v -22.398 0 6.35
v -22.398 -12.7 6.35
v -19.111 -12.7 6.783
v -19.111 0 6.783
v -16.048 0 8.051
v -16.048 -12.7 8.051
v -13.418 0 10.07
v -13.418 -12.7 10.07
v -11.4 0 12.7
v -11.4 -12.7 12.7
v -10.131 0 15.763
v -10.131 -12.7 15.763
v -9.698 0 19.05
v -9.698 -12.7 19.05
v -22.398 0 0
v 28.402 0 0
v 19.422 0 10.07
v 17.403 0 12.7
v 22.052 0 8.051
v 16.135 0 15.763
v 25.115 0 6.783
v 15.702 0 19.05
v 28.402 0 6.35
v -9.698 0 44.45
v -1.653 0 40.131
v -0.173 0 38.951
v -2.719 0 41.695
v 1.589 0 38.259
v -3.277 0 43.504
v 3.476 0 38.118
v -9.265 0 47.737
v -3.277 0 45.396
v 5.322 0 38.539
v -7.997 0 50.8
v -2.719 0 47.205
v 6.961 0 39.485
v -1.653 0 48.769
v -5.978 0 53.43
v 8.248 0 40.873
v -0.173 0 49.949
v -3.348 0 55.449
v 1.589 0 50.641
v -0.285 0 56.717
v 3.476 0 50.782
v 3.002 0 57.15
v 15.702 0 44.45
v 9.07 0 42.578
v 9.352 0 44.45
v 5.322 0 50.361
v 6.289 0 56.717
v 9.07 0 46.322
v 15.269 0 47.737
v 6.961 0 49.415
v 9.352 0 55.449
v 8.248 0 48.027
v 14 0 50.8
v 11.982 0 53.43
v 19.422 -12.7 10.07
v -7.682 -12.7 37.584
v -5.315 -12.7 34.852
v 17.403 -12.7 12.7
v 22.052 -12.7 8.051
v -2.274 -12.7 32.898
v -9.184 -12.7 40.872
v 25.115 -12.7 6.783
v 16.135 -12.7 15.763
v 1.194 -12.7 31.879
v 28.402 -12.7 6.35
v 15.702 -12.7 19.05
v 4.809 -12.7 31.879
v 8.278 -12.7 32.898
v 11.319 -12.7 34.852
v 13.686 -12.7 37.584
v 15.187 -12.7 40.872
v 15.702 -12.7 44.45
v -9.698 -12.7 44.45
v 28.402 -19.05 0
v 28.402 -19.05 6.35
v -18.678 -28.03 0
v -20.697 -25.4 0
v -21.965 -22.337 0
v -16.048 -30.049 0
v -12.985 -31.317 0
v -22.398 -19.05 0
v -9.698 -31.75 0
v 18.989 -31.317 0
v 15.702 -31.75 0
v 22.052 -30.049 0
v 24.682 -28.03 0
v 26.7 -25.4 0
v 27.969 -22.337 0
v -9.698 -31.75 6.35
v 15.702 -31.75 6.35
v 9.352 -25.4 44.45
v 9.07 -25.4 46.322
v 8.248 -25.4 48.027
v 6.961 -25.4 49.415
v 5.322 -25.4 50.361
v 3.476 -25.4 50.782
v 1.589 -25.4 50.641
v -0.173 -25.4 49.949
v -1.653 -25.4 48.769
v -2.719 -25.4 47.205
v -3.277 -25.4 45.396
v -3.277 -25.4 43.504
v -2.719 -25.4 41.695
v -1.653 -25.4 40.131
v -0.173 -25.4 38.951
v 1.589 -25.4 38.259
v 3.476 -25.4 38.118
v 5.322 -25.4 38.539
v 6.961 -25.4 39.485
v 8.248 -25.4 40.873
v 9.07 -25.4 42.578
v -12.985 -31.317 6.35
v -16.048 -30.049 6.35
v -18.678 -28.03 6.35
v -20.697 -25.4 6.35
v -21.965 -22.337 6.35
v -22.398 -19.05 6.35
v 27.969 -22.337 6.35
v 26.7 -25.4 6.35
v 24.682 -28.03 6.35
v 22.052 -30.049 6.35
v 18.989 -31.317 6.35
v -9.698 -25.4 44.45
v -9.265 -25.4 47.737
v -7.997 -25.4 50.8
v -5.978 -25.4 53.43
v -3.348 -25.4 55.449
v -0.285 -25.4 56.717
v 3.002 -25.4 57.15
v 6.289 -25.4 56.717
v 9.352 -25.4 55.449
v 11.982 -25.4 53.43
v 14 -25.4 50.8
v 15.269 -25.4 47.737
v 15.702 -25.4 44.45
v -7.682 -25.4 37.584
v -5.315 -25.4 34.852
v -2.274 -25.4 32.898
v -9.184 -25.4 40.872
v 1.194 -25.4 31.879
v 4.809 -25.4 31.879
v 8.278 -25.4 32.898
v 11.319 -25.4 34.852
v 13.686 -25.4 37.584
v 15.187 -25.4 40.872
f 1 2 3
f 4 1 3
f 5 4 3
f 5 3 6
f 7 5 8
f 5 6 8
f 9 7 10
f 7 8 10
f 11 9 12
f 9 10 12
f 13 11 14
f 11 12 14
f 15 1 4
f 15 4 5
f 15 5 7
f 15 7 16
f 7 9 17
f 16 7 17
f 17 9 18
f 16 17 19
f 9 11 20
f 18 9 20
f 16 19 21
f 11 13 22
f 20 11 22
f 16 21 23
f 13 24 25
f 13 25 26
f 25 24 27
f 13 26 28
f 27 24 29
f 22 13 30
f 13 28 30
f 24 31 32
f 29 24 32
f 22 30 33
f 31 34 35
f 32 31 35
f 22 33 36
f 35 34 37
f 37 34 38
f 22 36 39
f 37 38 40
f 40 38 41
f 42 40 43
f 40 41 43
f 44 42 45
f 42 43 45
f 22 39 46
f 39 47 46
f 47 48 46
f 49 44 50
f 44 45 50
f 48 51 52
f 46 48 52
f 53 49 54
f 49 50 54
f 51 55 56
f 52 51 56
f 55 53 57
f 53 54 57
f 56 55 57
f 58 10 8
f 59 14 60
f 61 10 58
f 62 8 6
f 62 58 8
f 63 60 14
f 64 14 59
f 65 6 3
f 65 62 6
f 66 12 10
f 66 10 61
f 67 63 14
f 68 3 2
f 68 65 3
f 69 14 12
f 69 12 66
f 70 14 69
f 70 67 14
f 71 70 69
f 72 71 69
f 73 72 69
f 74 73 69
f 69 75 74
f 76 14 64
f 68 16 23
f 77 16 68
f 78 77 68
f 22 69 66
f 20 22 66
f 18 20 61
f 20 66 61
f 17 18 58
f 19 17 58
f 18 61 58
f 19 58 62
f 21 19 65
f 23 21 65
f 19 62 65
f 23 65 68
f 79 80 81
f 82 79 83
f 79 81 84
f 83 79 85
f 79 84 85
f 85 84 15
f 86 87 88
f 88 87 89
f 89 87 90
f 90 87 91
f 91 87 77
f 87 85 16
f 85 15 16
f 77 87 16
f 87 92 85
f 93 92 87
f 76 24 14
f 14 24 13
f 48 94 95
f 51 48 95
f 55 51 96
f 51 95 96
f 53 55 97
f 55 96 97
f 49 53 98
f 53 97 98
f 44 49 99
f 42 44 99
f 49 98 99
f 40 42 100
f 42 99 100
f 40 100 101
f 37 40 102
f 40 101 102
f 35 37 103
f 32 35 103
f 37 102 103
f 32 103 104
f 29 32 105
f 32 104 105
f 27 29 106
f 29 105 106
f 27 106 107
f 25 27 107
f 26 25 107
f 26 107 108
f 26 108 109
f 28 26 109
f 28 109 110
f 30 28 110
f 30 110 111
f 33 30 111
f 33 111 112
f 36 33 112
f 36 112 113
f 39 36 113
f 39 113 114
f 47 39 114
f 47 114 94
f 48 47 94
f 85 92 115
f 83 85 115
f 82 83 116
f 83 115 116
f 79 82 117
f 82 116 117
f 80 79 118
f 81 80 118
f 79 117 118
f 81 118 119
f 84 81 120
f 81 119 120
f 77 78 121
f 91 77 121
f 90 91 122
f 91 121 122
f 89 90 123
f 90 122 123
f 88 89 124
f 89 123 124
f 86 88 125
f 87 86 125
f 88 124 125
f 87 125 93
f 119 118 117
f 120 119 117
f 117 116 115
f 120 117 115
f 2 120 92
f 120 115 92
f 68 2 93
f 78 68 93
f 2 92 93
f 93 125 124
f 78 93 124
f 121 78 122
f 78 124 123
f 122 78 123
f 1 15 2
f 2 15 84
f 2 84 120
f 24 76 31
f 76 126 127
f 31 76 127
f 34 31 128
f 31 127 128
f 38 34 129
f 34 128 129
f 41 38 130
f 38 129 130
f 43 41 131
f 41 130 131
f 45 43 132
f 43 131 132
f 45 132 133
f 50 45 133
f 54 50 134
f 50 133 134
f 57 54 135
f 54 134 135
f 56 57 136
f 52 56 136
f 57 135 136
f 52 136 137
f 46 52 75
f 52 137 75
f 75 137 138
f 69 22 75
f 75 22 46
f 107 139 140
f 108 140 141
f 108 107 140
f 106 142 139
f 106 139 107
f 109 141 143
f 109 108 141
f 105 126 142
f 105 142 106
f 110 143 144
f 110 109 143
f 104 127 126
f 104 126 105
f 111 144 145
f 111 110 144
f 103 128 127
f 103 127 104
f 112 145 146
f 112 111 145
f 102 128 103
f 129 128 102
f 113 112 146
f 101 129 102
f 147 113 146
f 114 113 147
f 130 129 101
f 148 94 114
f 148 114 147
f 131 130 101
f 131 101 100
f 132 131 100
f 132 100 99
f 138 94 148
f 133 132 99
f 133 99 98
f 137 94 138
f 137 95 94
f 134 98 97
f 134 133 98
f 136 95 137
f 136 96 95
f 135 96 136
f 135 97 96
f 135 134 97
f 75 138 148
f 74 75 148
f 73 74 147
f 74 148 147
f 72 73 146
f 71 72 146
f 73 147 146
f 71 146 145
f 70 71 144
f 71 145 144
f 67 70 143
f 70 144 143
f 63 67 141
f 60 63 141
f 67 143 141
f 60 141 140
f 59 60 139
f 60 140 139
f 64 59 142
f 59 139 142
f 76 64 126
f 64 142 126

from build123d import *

# Parameters (mm, degrees)
F1_DEPTH  = 31.75
F2_R      = 6.35
F3_DEPTH  = 31.75
F5_DEPTH  = 31.75
F7_DEPTH  = 19.05
F8_DEPTH  = 6.35
F9_W      = 12.7
F9_H      = 12.7
F10_DEPTH = 31.75
F11_W     = 12.7
F11_H     = 12.7
F12_DEPTH = 19.05
F14_DEPTH = 12.7
F15_W     = 12.7
F15_H     = 12.7
F16_DEPTH = 12.7
F18_DEPTH = 12.7
F19_R     = 1.5875
F20_DEPTH = 12.7
F22_DEPTH = 6.35


# Not quite as in the source:
# - a feature names something its author has since deleted; it is built from what else it names


with BuildPart() as f1:
    # F0 (on Front) → F1 (new body)
    with BuildSketch(Plane.XZ):
        Polygon((-9.6981803781, 6.35), (-22.3981803781, 6.35), (-22.3981803781, 0), (28.4018196219, 0), (28.4018196219, 6.35), (15.7018196219, 6.35), (15.7018196219, 57.15), (-9.6981803781, 57.15), align=None)
    extrude(amount=F1_DEPTH)

    # F2 (on face) → F3 (cut)
    with BuildSketch(Plane.XZ.offset(31.75)):
        with Locations((3.0018196219, 44.45)):
            Circle(F2_R)
    extrude(amount=-F3_DEPTH, mode=Mode.SUBTRACT)

    # F4 (on face) → F5 (cut)
    with BuildSketch(Plane.XZ.offset(31.75)):
        with BuildLine():
            ThreePointArc((-9.6981803781, 44.45), (-5.9784365163, 53.4302561039), (3.0018195733, 57.15))
            Line((3.0018195733, 57.15), (-9.6981803781, 57.15))
            Line((-9.6981803781, 57.15), (-9.6981803781, 44.45))
        make_face()
        with BuildLine():
            ThreePointArc((3.0018195733, 57.15), (11.9820757258, 53.4302561383), (15.7018196219, 44.45))
            Line((15.7018196219, 44.45), (15.7018196219, 57.15))
            Line((15.7018196219, 57.15), (3.0018195733, 57.15))
        make_face()
    extrude(amount=-F5_DEPTH, mode=Mode.SUBTRACT)

    # F6 (on face) → F7 (cut)
    with BuildSketch(Plane.XZ.offset(31.75)):
        with BuildLine():
            Line((15.7018196219, 6.35), (15.7018196219, 44.45))
            ThreePointArc((15.7018196219, 44.45), (3.0018196219, 31.75), (-9.6981803781, 44.45))
            Line((-9.6981803781, 44.45), (-9.6981803781, 6.35))
            Line((-9.6981803781, 6.35), (15.7018196219, 6.35))
        make_face()
    extrude(amount=-F7_DEPTH, mode=Mode.SUBTRACT)

    # F8 (cut): a face of the model
    f8_faces = [f1.faces().sort_by_distance(p)[0] for p in [
        (15.3426093771, -31.75, 44.45),
    ]]
    extrude(f8_faces, amount=-F8_DEPTH, mode=Mode.SUBTRACT)

    # F9 (on face) → F10 (join)
    with BuildSketch(Plane.XZ.offset(31.75)):
        with Locations((-16.0481803781, 12.7)):
            Rectangle(F9_W, F9_H)
    extrude(amount=-F10_DEPTH)

    # F11 (on face) → F12 (cut)
    with BuildSketch(Plane.XZ.offset(31.75)):
        with Locations((-16.0481803781, 12.7)):
            Rectangle(F11_W, F11_H)
    extrude(amount=-F12_DEPTH, mode=Mode.SUBTRACT)

    # F13 (on face) → F14 (cut)
    with BuildSketch(Plane.XZ.offset(12.7)):
        with BuildLine():
            Line((-22.3981803781, 19.05), (-22.3981803781, 6.35))
            ThreePointArc((-22.3981803781, 6.35), (-13.417924257, 10.0697438789), (-9.6981803781, 19.05))
            Line((-9.6981803781, 19.05), (-22.3981803781, 19.05))
        make_face()
    extrude(amount=-F14_DEPTH, mode=Mode.SUBTRACT)

    # F15 (on face) → F16 (join)
    with BuildSketch(Plane.XZ.offset(12.7)):
        with Locations((22.0518196219, 12.7)):
            Rectangle(F15_W, F15_H)
    extrude(amount=-F16_DEPTH)

    # F17 (on face) → F18 (cut)
    with BuildSketch(Plane.XZ.offset(12.7)):
        with BuildLine():
            Line((28.4018196219, 19.05), (15.7018196219, 19.05))
            ThreePointArc((15.7018196219, 19.05), (19.4215635009, 10.0697438789), (28.4018196219, 6.35))
            Line((28.4018196219, 6.35), (28.4018196219, 19.05))
        make_face()
    extrude(amount=-F18_DEPTH, mode=Mode.SUBTRACT)

    # F19 (on Top) → F20 (cut)
    with BuildSketch(Plane.XY):
        with Locations((-12.8731803781, -22.225)):
            Circle(F19_R)
        with Locations((18.8768196219, -22.225)):
            Circle(F19_R)
    extrude(amount=-F20_DEPTH, mode=Mode.SUBTRACT)

    # F21 (on face) → F22 (cut)
    with BuildSketch(Plane.XY.offset(6.35)):
        with BuildLine():
            ThreePointArc((-9.6981803781, -31.75), (-18.6784364991, -28.0302561211), (-22.3981803781, -19.05))
            Line((-22.3981803781, -19.05), (-22.3981803781, -31.75))
            Line((-22.3981803781, -31.75), (-9.6981803781, -31.75))
        make_face()
        with BuildLine():
            ThreePointArc((28.4018196219, -19.05), (24.682075743, -28.0302561211), (15.7018196219, -31.75))
            Line((15.7018196219, -31.75), (28.4018196219, -31.75))
            Line((28.4018196219, -31.75), (28.4018196219, -19.05))
        make_face()
    extrude(amount=-F22_DEPTH, mode=Mode.SUBTRACT)


solid = f1.part
